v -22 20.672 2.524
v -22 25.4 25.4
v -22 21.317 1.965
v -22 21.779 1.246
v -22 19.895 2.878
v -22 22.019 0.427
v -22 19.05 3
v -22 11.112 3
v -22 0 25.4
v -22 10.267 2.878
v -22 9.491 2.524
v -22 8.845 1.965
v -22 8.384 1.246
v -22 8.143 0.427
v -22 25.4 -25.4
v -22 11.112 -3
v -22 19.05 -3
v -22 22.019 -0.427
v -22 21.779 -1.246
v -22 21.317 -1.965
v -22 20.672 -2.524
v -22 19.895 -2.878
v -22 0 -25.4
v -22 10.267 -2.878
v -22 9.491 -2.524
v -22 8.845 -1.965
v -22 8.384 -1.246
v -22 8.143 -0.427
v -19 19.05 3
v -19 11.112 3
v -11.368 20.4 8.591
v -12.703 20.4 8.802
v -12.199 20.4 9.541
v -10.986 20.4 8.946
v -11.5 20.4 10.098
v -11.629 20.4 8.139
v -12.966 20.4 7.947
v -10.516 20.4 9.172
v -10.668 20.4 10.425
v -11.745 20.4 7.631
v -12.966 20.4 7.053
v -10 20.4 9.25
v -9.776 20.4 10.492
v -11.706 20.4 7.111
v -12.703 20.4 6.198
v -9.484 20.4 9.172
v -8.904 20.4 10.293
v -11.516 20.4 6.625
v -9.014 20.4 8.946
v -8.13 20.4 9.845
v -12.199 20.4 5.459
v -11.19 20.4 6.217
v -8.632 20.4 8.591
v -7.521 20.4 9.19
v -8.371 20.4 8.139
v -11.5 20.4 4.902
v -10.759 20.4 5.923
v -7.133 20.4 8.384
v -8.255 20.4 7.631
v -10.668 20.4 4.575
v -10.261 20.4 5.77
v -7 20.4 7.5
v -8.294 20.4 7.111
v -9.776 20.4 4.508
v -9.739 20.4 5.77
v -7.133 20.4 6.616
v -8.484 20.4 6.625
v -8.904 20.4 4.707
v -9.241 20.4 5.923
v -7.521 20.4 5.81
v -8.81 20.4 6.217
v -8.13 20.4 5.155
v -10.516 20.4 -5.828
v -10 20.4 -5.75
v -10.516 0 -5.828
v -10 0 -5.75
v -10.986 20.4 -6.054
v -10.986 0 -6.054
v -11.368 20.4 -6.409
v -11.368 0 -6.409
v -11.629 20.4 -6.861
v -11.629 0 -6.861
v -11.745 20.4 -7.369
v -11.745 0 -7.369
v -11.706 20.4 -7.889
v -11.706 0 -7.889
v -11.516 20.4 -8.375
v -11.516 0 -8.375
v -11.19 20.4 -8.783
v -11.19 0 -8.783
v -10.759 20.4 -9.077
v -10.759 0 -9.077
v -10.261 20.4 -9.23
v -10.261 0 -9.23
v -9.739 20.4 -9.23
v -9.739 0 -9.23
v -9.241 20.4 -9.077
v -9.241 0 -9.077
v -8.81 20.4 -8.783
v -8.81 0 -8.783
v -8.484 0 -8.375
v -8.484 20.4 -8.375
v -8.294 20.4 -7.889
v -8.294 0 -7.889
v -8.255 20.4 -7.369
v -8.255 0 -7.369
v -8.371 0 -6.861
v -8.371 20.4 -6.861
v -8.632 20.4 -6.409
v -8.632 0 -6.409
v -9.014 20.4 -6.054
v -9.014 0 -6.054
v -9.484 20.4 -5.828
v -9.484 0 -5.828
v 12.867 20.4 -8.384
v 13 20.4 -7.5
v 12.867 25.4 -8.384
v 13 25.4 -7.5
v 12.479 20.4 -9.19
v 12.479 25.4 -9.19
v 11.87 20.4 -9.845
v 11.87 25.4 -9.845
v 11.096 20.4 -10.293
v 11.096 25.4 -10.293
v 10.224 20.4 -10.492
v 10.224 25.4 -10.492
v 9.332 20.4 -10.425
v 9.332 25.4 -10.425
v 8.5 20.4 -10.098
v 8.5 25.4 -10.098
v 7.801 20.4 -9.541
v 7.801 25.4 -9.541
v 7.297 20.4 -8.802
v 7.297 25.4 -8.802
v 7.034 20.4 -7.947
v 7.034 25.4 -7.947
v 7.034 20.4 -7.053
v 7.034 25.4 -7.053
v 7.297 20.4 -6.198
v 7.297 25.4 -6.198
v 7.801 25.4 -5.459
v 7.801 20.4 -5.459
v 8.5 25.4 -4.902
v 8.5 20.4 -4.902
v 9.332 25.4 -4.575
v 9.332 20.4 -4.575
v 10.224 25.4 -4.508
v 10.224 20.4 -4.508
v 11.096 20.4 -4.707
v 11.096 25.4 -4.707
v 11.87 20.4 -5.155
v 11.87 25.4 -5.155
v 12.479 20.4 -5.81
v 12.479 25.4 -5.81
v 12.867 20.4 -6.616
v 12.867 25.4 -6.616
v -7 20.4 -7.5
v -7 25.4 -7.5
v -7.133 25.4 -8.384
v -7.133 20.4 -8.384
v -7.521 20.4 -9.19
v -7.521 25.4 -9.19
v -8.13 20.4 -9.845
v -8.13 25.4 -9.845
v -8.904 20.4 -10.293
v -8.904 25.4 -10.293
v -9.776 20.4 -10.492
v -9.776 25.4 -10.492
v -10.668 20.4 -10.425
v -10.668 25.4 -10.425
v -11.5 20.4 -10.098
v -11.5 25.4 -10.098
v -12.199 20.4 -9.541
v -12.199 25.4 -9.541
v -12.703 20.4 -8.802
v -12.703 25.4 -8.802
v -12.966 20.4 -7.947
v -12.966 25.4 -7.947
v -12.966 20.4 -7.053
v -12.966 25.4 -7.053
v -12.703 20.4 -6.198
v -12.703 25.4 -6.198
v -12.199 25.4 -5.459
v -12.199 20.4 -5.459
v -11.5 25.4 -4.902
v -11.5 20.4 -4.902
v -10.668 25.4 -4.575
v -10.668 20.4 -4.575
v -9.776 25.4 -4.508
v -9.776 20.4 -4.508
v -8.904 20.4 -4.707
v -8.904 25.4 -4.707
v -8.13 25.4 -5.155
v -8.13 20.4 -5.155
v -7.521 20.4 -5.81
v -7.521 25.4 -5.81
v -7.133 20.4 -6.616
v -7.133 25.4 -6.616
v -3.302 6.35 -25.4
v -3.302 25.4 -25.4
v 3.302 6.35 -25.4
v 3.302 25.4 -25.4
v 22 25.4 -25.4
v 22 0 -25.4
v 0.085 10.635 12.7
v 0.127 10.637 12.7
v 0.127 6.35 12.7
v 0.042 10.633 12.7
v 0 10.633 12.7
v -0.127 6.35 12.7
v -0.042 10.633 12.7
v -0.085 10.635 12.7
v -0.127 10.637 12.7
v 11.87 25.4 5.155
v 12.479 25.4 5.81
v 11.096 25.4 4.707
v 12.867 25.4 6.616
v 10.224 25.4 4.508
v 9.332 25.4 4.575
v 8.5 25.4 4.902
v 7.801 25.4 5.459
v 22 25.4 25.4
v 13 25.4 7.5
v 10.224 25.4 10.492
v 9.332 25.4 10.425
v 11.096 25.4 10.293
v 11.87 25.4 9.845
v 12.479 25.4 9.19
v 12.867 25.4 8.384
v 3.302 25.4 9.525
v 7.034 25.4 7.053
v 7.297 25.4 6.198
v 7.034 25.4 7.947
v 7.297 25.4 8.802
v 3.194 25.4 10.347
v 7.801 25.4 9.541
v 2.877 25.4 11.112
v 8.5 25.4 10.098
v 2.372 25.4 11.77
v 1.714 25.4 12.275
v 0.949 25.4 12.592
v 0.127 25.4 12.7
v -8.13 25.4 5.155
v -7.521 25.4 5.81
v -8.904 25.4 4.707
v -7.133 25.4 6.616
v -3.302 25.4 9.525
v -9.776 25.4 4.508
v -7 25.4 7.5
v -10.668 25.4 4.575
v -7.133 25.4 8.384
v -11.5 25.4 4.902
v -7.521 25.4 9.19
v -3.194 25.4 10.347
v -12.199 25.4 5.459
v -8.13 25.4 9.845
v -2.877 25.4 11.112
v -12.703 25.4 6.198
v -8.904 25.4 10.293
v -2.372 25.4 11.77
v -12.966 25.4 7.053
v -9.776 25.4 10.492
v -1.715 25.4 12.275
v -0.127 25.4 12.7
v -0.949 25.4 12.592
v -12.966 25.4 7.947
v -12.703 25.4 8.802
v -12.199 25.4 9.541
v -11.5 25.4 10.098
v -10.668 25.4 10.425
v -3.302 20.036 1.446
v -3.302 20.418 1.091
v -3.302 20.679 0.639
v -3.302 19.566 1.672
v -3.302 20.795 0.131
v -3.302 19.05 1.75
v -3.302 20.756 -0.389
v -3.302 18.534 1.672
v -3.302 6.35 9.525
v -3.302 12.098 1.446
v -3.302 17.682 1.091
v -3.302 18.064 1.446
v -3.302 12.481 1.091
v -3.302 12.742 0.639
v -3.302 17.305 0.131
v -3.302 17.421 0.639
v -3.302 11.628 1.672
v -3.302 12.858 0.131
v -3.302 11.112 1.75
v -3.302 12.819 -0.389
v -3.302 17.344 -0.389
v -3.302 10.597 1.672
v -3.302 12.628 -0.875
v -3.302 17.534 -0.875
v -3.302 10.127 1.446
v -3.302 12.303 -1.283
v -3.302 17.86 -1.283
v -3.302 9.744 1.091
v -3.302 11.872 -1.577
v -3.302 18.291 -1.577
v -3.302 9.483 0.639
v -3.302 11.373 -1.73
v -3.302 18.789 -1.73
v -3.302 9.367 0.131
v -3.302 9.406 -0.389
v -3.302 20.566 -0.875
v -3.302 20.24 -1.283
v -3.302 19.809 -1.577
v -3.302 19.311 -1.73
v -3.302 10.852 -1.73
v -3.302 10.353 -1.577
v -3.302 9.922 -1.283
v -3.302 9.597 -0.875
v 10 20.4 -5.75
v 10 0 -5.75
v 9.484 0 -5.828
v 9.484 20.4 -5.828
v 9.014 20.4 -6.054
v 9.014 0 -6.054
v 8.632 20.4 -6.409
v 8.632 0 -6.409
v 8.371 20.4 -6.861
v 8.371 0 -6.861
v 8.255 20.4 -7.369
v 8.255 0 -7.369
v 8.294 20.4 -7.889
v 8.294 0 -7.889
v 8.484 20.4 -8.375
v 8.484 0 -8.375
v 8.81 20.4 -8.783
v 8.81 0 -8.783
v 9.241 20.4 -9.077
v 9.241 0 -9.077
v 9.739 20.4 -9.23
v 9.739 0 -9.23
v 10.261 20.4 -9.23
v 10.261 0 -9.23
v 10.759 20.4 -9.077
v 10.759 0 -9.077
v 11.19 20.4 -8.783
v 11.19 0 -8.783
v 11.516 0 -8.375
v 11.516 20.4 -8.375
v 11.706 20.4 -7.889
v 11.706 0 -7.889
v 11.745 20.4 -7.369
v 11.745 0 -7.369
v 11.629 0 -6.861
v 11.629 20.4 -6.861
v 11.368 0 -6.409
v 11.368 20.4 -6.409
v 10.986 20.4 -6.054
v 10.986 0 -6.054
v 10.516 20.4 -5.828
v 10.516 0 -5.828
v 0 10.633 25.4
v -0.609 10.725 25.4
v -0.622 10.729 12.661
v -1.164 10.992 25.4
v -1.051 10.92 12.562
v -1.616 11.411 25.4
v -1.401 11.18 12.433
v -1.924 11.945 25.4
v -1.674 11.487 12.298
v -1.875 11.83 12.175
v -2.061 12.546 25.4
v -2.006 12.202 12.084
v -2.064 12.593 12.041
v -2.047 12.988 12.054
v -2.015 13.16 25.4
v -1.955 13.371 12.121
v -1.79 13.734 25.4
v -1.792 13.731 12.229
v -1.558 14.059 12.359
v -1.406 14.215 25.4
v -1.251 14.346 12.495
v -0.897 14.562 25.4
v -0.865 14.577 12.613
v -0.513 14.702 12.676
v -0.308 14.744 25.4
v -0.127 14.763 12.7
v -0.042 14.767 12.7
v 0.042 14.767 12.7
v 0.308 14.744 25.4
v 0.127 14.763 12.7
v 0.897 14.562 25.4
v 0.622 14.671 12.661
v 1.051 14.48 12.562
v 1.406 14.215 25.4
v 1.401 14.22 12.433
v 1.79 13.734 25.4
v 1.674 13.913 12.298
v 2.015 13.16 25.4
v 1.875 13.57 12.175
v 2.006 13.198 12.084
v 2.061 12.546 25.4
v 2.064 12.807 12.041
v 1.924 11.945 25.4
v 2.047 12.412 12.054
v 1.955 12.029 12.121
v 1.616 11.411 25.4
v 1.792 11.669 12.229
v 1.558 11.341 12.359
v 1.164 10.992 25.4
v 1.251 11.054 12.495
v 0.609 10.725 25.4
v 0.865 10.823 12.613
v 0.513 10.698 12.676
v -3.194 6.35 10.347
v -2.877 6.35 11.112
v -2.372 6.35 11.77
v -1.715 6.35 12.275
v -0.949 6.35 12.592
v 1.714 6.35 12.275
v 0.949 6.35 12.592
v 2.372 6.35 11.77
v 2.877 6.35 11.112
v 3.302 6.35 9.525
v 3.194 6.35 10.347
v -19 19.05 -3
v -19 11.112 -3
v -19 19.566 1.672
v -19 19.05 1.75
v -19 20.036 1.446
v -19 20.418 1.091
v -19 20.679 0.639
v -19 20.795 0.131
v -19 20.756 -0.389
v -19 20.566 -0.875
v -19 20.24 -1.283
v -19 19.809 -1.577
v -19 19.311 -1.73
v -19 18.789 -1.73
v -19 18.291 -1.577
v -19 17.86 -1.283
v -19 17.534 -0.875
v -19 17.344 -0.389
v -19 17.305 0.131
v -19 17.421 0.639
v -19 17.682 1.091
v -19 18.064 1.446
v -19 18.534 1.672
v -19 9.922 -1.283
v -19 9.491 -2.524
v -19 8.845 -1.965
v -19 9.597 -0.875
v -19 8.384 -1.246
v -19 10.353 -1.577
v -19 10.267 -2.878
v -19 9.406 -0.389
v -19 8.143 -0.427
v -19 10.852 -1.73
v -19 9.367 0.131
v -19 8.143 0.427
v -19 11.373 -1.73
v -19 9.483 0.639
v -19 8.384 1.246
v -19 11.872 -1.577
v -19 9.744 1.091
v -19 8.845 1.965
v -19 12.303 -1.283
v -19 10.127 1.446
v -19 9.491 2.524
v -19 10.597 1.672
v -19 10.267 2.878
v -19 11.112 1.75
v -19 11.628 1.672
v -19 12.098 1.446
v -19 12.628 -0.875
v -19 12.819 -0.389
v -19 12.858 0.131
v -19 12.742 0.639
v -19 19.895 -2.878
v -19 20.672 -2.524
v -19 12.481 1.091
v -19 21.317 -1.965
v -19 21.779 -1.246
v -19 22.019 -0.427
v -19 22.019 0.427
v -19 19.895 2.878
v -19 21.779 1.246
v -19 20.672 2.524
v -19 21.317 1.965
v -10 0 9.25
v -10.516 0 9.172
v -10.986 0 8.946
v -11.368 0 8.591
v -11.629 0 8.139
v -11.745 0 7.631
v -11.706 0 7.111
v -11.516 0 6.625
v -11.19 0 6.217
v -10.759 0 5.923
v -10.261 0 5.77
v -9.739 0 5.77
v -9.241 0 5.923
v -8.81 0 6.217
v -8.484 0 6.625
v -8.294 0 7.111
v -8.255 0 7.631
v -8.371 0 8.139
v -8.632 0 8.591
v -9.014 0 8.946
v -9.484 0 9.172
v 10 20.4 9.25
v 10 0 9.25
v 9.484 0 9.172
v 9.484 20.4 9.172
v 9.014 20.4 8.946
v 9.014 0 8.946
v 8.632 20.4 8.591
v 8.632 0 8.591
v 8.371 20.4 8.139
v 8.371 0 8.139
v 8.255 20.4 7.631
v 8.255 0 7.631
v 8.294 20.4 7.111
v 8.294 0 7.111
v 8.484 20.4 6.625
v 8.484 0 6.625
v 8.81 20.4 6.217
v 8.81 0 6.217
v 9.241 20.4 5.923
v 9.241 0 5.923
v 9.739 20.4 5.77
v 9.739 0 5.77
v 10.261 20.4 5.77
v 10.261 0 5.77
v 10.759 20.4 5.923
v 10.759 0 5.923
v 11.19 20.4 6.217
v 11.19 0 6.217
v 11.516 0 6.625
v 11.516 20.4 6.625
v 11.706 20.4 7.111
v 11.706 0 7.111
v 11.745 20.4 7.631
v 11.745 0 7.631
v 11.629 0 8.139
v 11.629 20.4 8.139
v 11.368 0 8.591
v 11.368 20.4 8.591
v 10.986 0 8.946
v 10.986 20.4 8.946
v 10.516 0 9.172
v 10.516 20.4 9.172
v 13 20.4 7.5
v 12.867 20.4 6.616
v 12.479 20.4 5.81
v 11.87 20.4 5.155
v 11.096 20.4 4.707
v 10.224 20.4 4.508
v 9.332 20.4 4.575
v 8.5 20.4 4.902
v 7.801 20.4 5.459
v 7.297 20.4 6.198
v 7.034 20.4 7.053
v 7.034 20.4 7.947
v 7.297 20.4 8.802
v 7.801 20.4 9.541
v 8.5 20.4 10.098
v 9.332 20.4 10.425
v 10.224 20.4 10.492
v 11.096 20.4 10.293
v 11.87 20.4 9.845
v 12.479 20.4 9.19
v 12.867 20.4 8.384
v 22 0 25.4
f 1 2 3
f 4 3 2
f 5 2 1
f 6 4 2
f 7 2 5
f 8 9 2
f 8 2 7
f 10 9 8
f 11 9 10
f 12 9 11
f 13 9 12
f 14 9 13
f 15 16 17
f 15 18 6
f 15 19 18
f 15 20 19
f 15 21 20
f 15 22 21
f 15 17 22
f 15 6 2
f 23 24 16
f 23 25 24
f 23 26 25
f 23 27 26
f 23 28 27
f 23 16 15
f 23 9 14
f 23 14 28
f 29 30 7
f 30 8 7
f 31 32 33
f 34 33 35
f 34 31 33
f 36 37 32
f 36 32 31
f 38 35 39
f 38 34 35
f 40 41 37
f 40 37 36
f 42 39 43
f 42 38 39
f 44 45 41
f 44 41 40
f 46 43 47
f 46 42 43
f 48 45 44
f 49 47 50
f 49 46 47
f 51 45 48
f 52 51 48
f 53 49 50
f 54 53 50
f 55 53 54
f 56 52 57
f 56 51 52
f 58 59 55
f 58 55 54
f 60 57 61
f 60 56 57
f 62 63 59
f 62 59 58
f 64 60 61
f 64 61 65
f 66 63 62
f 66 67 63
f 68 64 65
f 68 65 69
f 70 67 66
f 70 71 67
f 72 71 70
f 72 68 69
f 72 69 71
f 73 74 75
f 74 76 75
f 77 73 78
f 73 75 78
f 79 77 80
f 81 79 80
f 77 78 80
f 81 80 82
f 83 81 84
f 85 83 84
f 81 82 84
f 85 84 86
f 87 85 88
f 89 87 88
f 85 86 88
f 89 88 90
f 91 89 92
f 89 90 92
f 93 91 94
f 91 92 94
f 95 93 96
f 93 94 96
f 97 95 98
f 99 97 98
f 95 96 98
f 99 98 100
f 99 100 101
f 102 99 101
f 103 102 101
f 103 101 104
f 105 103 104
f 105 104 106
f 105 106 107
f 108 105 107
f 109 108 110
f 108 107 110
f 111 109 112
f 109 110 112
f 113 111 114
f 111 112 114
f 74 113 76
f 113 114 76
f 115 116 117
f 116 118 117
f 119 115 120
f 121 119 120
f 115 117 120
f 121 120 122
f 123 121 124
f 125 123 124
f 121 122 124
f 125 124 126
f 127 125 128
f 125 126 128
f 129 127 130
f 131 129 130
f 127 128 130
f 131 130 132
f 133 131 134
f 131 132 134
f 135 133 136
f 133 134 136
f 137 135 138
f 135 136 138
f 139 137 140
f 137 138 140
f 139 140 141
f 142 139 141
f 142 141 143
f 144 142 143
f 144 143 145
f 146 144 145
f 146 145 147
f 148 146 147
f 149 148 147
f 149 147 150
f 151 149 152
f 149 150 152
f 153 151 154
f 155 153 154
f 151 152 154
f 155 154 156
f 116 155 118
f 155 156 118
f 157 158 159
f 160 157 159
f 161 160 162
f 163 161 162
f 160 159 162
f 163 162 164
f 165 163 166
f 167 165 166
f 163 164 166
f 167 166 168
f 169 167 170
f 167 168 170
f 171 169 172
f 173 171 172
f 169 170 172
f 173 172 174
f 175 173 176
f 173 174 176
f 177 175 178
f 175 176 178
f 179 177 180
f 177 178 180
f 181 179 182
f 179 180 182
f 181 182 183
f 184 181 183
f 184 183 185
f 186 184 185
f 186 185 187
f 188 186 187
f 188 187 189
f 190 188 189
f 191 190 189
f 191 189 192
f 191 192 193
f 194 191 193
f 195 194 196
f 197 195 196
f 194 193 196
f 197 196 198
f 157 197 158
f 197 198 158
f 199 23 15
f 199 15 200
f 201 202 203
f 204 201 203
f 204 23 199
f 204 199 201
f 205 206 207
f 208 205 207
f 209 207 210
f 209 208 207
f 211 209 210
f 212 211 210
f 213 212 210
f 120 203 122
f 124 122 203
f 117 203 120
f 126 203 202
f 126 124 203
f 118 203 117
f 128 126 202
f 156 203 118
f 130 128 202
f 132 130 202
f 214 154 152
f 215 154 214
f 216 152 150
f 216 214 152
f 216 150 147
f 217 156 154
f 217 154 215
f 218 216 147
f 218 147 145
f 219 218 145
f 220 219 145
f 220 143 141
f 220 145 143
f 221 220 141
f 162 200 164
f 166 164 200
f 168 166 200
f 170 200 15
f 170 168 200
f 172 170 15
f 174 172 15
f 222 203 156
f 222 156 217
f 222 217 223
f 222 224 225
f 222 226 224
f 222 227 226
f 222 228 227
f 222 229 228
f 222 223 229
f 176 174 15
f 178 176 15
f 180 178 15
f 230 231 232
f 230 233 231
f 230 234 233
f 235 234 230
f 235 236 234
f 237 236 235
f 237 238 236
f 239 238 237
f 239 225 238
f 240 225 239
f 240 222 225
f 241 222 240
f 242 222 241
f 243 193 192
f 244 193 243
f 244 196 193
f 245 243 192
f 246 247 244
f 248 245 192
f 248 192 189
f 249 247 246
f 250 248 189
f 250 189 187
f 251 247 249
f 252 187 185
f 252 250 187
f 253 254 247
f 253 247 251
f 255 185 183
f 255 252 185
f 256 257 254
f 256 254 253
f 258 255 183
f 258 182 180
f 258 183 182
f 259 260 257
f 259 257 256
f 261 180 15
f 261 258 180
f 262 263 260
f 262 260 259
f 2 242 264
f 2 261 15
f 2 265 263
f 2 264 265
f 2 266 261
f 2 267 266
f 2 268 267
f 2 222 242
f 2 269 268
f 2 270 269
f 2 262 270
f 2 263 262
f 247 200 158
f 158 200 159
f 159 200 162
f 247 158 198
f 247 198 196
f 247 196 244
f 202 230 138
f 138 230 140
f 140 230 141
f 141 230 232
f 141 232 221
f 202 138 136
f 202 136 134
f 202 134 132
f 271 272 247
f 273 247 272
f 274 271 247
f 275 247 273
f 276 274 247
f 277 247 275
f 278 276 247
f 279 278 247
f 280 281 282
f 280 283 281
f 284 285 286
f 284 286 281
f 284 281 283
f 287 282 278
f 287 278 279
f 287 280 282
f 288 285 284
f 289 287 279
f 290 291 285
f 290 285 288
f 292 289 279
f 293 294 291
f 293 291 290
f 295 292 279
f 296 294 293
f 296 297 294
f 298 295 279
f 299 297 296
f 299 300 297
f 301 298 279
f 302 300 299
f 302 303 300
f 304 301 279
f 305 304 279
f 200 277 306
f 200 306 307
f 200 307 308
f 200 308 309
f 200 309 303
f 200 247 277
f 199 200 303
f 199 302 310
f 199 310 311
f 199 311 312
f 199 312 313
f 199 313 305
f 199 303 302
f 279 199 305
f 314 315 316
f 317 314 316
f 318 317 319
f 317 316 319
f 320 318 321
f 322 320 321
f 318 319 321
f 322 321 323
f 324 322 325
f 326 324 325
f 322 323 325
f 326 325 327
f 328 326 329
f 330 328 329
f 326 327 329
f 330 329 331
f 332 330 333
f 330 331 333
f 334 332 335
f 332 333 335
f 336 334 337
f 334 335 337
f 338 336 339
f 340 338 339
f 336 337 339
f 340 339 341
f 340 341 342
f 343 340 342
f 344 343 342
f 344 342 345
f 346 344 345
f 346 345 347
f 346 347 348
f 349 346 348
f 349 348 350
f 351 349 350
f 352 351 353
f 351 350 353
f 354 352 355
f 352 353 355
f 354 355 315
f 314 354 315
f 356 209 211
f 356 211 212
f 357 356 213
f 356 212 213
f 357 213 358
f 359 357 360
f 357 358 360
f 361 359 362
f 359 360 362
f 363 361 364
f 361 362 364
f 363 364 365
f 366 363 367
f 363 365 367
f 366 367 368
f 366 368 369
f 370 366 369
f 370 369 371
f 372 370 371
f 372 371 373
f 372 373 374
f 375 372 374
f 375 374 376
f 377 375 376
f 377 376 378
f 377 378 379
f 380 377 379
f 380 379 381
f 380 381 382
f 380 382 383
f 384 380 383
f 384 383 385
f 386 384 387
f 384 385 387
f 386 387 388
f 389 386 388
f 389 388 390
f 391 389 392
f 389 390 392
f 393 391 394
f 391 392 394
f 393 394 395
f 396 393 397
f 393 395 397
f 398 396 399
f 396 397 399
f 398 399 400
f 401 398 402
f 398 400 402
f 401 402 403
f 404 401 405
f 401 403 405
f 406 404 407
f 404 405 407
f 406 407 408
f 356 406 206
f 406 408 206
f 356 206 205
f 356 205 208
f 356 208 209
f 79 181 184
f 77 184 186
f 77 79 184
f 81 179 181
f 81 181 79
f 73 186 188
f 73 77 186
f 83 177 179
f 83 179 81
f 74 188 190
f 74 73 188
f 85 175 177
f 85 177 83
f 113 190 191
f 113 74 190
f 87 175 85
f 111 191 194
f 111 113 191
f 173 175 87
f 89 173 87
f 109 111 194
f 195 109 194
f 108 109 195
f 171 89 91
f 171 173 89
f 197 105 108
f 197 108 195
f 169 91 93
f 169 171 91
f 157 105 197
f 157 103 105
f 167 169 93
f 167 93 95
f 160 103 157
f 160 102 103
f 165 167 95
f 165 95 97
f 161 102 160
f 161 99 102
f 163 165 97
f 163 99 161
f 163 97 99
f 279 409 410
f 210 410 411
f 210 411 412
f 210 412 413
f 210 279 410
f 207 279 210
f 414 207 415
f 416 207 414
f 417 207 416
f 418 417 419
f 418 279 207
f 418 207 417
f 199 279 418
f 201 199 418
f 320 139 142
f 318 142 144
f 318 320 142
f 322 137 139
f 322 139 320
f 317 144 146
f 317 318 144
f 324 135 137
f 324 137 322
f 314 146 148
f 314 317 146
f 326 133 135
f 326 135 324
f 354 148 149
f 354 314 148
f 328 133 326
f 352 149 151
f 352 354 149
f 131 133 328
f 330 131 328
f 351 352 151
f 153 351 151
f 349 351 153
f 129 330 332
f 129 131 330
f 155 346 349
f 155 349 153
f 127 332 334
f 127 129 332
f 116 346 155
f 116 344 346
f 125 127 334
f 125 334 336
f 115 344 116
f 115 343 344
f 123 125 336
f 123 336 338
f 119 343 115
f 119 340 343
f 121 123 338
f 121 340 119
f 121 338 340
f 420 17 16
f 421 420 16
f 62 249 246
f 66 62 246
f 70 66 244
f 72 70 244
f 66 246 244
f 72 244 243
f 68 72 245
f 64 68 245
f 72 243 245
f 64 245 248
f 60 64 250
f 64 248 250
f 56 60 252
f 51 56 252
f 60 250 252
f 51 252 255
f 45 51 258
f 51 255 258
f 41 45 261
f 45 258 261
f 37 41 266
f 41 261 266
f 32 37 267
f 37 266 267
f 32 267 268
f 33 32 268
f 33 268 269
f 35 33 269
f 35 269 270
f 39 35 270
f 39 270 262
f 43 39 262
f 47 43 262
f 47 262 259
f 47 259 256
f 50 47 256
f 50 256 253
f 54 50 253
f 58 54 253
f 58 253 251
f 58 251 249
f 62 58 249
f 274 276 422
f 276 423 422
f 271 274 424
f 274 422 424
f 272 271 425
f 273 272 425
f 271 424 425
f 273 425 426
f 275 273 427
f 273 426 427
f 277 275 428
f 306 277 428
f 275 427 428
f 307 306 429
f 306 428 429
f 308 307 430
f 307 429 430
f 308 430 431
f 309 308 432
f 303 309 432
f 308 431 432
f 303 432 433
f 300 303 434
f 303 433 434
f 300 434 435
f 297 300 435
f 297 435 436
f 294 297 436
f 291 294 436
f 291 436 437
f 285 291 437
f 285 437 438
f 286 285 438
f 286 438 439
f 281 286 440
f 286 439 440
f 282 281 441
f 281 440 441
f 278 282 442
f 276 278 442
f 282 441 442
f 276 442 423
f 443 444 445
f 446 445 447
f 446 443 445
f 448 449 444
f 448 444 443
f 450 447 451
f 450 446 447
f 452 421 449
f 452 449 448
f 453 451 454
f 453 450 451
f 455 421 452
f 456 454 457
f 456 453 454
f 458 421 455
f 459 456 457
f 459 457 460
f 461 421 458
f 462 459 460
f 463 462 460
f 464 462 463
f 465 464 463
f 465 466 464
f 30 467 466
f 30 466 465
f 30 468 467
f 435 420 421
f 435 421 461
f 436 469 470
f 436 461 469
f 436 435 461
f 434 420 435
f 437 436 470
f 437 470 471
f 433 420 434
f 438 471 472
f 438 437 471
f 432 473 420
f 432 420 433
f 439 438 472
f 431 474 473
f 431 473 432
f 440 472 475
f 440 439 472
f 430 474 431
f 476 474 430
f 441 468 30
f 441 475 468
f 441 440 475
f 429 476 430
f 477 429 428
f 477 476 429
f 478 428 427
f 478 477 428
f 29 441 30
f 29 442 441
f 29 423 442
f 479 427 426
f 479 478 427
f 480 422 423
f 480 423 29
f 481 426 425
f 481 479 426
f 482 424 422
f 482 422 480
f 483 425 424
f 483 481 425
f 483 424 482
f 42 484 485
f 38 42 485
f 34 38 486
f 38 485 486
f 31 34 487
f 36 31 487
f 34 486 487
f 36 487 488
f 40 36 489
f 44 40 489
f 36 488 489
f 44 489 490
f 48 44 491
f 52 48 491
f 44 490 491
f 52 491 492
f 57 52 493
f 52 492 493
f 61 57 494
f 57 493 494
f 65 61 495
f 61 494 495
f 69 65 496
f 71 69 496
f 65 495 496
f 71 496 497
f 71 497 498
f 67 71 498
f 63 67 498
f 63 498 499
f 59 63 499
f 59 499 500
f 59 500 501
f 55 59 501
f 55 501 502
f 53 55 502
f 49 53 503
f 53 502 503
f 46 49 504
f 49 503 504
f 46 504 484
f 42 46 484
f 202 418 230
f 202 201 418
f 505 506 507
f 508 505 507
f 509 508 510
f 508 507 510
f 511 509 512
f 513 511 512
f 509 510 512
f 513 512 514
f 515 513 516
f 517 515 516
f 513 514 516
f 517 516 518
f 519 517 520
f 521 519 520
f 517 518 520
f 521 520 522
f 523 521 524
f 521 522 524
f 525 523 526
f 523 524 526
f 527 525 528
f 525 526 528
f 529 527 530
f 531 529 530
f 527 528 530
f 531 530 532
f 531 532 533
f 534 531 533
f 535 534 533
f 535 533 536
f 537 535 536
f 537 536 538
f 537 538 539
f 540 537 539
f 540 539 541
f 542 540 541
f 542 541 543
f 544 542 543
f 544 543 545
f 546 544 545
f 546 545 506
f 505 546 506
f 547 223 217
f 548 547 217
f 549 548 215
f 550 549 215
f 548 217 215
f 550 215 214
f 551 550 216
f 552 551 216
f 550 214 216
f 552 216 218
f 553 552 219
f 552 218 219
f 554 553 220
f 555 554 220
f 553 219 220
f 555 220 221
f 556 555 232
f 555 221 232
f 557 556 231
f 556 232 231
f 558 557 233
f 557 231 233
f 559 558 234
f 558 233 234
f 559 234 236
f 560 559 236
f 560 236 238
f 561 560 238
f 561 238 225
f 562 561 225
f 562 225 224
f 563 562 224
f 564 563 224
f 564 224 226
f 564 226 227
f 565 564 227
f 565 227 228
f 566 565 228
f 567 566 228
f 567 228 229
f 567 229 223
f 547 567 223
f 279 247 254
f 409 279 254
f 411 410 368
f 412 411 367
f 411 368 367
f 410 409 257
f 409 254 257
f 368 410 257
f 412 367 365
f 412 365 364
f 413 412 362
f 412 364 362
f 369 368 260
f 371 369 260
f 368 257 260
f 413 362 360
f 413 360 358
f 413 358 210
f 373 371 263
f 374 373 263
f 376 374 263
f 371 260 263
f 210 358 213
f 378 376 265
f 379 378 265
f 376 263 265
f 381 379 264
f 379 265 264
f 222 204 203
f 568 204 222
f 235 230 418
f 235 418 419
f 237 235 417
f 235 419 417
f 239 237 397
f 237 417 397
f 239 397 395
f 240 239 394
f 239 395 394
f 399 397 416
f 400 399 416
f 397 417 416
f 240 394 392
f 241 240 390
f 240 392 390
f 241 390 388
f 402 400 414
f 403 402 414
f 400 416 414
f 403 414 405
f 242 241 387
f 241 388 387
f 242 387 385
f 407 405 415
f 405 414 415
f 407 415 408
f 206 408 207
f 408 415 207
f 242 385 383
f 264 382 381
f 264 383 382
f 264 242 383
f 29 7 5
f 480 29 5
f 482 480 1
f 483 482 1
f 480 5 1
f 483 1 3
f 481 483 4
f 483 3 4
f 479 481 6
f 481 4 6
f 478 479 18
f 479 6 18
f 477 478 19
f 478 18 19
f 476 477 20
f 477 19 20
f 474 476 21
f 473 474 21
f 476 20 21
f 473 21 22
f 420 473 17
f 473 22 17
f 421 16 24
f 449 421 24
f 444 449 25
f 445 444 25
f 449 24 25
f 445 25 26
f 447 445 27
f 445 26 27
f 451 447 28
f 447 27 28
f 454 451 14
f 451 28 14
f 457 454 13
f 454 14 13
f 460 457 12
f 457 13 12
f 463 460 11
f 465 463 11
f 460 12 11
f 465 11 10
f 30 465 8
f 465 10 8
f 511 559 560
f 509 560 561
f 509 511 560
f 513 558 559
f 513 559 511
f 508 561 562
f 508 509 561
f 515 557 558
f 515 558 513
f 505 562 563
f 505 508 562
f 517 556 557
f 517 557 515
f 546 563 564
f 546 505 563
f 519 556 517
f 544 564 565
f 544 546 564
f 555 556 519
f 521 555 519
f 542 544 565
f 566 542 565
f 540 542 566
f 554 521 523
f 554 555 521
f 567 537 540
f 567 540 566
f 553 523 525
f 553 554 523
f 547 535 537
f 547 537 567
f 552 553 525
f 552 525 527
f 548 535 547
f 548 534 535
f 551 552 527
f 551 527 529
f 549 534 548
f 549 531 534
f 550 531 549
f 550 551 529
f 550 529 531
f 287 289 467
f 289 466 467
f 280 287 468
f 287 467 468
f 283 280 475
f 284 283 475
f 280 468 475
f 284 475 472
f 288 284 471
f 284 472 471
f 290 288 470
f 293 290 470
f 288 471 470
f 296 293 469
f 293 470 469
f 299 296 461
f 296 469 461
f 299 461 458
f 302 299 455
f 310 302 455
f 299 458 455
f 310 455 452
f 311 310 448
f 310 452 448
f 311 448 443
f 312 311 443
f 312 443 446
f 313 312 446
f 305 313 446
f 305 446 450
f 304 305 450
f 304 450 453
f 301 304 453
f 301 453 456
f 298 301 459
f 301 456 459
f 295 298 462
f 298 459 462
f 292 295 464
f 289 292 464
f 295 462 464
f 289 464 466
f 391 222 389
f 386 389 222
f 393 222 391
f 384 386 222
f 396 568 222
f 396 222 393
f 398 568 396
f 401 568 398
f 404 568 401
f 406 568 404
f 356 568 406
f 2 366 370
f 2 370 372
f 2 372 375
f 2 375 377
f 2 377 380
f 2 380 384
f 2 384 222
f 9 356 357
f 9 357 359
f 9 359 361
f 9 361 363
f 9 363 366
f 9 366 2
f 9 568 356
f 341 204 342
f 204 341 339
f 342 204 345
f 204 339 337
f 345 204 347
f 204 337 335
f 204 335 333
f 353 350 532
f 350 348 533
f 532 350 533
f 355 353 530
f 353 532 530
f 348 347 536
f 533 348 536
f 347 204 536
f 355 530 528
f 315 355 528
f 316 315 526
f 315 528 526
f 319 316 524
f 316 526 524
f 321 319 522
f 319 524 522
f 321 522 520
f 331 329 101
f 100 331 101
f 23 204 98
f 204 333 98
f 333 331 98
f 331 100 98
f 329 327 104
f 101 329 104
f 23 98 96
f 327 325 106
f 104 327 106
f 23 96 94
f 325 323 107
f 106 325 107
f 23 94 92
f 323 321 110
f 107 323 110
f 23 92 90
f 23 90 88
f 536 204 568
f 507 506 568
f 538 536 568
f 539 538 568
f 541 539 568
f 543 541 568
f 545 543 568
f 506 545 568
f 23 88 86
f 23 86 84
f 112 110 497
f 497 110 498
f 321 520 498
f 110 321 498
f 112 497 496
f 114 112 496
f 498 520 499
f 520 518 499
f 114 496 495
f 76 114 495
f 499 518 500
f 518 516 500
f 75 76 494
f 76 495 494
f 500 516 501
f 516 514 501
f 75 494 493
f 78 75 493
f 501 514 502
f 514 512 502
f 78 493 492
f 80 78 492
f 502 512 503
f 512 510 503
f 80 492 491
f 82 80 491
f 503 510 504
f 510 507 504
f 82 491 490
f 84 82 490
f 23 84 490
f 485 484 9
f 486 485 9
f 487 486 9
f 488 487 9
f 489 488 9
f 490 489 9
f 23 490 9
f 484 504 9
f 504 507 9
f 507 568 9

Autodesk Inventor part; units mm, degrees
ref_plane "YZ Plane" through (0, 0, 0) normal (1, 0, 0) x (0, 1, 0)
ref_plane "XZ Plane" through (0, 0, 0) normal (0, 1, 0) x (-1, 0, 0)
ref_plane "XY Plane" through (0, 0, 0) normal (0, 0, 1) x (1, 0, 0)
sketch "Sketch2" plane through (0, 0, 0) normal (0, 1, 0) x (-1, 0, 0)
  line L0 (-22, 25.4) -> (22, 25.4)
  line L1 (22, 25.4) -> (22, -25.4)
  line L2 (22, -25.4) -> (-22, -25.4)
  line L3 (-22, -25.4) -> (-22, 25.4)
  line L4 (-22, 25.4) -> (22, -25.4) construction
  line L5 (22, 25.4) -> (-22, -25.4) construction
  point P0 (0, 0)
  dimension "d0" = 50.8
  dimension "d1" = 44
extrude "Extrusion1" add sketch "Sketch2" along normal blind 25.4
sketch "Sketch3" plane through (-22, 0, 25.4) normal (0, 0, 1) x (1, 0, 0)
  line L0 (0, 25.4) -> (44, 25.4) construction
  line L1 (0, 0) -> (44, 0) construction
  line L2 (44, 0) -> (44, 25.4) construction
  line L3 (44, 25.4) -> (0, 25.4) construction
  line L4 (0, 25.4) -> (0, 0) construction
  line L5 (0, 0) -> (44, 25.4) construction
  line L6 (44, 0) -> (0, 25.4) construction
  line L7 (44, 0) -> (0, 0) projected
  point P0 (22, 0)
  point P1 (22, 12.7)
hole "Hole1" at (0, 12.7, 25.4) direction (0, 0, -1) diameter 4.134 depth 12.7 tip angle 118 thread size "M5x0.8" class "6H" standard "ANSI Metric M Profile"
sketch "Sketch4" plane through (0, 25.4, 0) normal (0, 1, 0) x (1, 0, 0)
  line L0 (10, -7.5) -> (10, 7.5) construction
  line L1 (10, 7.5) -> (-10, 7.5) construction
  line L2 (-10, 7.5) -> (-10, -7.5) construction
  line L3 (-10, -7.5) -> (10, -7.5) construction
  line L4 (10, -7.5) -> (-10, 7.5) construction
  line L5 (10, 7.5) -> (-10, -7.5) construction
  circle A0 centre (-10, 7.5) radius 3
  circle A1 centre (10, 7.5) radius 3
  circle A2 centre (10, -7.5) radius 3
  circle A3 centre (-10, -7.5) radius 3
  point P0 (0, 0)
  dimension "d11" = 20
  dimension "d12" = 15
  dimension "d13" = 6
  dimension "d14" = 6
  dimension "d15" = 6
  dimension "d16" = 6
extrude "Extrusion2" cut sketch "Sketch4" against normal blind 5
sketch "Sketch5" plane through (-10, 20.4, 7.5) normal (0, 1, 0) x (1, 0, 0)
  circle A0 centre (0, 15) radius 3 projected
  circle A1 centre (20, 0) radius 3 projected
  circle A2 centre (20, 15) radius 3 projected
  point P0 (10, 7.5)
  point P1 (0, 0)
hole "Hole2" at (-10, 20.4, -7.5) at (-10, 20.4, 7.5) at (10, 20.4, 7.5) at (10, 20.4, -7.5) direction (0, -1, 0) diameter 3.5 end through all
sketch "Sketch8" plane through (-22, 0, -25.4) normal (-1, 0, 0) x (0, 0, 1)
  circle A0 centre (25.4, 19.05) radius 1.75
  line L0 (0, 25.4) -> (50.8, 25.4) projected
  line L1 (0, 0) -> (0, 25.4) projected
  circle A1 centre (25.4, 11.1125) radius 1.75
  arc A2 (28.4, 19.05) -> (22.4, 19.05) centre (25.4, 19.05) ccw
  arc A3 (22.4, 11.1125) -> (28.4, 11.1125) centre (25.4, 11.1125) ccw
  line L2 (28.4, 11.1125) -> (28.4, 19.05)
  line L3 (22.4, 19.05) -> (22.4, 11.1125)
  point P0 (25.4, 0)
  dimension "d31" = 3.5
  dimension "d32" = 6.35
  dimension "d33" = 25.4
  dimension "d41" = 3.5
  dimension "d42" = 7.9375
  dimension "d43" = 6
  dimension "d44" = 6
extrude "Extrusion4" cut sketch "Sketch8" against normal blind 22 contours A0 | A1
sketch "Sketch9" plane through (22, 0, -25.4) normal (0, 0, -1) x (-1, 0, 0)
  line L0 (44, 25.4) -> (0, 25.4) projected
  line L1 (18.698, 25.4) -> (25.302, 25.4)
  line L2 (25.302, 25.4) -> (25.302, 6.35)
  line L3 (25.302, 6.35) -> (18.698, 6.35)
  line L4 (18.698, 6.35) -> (18.698, 25.4)
  line L5 (44, 0) -> (44, 25.4) projected
  point P0 (22, 0)
  point P1 (22, 6.35)
  dimension "d36" = 6.604
  dimension "d37" = 22
  dimension "d38" = 19.05
extrude "Extrusion5" cut sketch "Sketch9" against normal blind 38.1
extrude "Extrusion6" cut sketch "Sketch8" against normal blind 3
fillet "Fillet1" radius 3.175 2 edges at (3.302, 15.875, 12.7) (-3.302, 15.875, 12.7)
properties part number "Mass 1" material "Steel, Mild"
